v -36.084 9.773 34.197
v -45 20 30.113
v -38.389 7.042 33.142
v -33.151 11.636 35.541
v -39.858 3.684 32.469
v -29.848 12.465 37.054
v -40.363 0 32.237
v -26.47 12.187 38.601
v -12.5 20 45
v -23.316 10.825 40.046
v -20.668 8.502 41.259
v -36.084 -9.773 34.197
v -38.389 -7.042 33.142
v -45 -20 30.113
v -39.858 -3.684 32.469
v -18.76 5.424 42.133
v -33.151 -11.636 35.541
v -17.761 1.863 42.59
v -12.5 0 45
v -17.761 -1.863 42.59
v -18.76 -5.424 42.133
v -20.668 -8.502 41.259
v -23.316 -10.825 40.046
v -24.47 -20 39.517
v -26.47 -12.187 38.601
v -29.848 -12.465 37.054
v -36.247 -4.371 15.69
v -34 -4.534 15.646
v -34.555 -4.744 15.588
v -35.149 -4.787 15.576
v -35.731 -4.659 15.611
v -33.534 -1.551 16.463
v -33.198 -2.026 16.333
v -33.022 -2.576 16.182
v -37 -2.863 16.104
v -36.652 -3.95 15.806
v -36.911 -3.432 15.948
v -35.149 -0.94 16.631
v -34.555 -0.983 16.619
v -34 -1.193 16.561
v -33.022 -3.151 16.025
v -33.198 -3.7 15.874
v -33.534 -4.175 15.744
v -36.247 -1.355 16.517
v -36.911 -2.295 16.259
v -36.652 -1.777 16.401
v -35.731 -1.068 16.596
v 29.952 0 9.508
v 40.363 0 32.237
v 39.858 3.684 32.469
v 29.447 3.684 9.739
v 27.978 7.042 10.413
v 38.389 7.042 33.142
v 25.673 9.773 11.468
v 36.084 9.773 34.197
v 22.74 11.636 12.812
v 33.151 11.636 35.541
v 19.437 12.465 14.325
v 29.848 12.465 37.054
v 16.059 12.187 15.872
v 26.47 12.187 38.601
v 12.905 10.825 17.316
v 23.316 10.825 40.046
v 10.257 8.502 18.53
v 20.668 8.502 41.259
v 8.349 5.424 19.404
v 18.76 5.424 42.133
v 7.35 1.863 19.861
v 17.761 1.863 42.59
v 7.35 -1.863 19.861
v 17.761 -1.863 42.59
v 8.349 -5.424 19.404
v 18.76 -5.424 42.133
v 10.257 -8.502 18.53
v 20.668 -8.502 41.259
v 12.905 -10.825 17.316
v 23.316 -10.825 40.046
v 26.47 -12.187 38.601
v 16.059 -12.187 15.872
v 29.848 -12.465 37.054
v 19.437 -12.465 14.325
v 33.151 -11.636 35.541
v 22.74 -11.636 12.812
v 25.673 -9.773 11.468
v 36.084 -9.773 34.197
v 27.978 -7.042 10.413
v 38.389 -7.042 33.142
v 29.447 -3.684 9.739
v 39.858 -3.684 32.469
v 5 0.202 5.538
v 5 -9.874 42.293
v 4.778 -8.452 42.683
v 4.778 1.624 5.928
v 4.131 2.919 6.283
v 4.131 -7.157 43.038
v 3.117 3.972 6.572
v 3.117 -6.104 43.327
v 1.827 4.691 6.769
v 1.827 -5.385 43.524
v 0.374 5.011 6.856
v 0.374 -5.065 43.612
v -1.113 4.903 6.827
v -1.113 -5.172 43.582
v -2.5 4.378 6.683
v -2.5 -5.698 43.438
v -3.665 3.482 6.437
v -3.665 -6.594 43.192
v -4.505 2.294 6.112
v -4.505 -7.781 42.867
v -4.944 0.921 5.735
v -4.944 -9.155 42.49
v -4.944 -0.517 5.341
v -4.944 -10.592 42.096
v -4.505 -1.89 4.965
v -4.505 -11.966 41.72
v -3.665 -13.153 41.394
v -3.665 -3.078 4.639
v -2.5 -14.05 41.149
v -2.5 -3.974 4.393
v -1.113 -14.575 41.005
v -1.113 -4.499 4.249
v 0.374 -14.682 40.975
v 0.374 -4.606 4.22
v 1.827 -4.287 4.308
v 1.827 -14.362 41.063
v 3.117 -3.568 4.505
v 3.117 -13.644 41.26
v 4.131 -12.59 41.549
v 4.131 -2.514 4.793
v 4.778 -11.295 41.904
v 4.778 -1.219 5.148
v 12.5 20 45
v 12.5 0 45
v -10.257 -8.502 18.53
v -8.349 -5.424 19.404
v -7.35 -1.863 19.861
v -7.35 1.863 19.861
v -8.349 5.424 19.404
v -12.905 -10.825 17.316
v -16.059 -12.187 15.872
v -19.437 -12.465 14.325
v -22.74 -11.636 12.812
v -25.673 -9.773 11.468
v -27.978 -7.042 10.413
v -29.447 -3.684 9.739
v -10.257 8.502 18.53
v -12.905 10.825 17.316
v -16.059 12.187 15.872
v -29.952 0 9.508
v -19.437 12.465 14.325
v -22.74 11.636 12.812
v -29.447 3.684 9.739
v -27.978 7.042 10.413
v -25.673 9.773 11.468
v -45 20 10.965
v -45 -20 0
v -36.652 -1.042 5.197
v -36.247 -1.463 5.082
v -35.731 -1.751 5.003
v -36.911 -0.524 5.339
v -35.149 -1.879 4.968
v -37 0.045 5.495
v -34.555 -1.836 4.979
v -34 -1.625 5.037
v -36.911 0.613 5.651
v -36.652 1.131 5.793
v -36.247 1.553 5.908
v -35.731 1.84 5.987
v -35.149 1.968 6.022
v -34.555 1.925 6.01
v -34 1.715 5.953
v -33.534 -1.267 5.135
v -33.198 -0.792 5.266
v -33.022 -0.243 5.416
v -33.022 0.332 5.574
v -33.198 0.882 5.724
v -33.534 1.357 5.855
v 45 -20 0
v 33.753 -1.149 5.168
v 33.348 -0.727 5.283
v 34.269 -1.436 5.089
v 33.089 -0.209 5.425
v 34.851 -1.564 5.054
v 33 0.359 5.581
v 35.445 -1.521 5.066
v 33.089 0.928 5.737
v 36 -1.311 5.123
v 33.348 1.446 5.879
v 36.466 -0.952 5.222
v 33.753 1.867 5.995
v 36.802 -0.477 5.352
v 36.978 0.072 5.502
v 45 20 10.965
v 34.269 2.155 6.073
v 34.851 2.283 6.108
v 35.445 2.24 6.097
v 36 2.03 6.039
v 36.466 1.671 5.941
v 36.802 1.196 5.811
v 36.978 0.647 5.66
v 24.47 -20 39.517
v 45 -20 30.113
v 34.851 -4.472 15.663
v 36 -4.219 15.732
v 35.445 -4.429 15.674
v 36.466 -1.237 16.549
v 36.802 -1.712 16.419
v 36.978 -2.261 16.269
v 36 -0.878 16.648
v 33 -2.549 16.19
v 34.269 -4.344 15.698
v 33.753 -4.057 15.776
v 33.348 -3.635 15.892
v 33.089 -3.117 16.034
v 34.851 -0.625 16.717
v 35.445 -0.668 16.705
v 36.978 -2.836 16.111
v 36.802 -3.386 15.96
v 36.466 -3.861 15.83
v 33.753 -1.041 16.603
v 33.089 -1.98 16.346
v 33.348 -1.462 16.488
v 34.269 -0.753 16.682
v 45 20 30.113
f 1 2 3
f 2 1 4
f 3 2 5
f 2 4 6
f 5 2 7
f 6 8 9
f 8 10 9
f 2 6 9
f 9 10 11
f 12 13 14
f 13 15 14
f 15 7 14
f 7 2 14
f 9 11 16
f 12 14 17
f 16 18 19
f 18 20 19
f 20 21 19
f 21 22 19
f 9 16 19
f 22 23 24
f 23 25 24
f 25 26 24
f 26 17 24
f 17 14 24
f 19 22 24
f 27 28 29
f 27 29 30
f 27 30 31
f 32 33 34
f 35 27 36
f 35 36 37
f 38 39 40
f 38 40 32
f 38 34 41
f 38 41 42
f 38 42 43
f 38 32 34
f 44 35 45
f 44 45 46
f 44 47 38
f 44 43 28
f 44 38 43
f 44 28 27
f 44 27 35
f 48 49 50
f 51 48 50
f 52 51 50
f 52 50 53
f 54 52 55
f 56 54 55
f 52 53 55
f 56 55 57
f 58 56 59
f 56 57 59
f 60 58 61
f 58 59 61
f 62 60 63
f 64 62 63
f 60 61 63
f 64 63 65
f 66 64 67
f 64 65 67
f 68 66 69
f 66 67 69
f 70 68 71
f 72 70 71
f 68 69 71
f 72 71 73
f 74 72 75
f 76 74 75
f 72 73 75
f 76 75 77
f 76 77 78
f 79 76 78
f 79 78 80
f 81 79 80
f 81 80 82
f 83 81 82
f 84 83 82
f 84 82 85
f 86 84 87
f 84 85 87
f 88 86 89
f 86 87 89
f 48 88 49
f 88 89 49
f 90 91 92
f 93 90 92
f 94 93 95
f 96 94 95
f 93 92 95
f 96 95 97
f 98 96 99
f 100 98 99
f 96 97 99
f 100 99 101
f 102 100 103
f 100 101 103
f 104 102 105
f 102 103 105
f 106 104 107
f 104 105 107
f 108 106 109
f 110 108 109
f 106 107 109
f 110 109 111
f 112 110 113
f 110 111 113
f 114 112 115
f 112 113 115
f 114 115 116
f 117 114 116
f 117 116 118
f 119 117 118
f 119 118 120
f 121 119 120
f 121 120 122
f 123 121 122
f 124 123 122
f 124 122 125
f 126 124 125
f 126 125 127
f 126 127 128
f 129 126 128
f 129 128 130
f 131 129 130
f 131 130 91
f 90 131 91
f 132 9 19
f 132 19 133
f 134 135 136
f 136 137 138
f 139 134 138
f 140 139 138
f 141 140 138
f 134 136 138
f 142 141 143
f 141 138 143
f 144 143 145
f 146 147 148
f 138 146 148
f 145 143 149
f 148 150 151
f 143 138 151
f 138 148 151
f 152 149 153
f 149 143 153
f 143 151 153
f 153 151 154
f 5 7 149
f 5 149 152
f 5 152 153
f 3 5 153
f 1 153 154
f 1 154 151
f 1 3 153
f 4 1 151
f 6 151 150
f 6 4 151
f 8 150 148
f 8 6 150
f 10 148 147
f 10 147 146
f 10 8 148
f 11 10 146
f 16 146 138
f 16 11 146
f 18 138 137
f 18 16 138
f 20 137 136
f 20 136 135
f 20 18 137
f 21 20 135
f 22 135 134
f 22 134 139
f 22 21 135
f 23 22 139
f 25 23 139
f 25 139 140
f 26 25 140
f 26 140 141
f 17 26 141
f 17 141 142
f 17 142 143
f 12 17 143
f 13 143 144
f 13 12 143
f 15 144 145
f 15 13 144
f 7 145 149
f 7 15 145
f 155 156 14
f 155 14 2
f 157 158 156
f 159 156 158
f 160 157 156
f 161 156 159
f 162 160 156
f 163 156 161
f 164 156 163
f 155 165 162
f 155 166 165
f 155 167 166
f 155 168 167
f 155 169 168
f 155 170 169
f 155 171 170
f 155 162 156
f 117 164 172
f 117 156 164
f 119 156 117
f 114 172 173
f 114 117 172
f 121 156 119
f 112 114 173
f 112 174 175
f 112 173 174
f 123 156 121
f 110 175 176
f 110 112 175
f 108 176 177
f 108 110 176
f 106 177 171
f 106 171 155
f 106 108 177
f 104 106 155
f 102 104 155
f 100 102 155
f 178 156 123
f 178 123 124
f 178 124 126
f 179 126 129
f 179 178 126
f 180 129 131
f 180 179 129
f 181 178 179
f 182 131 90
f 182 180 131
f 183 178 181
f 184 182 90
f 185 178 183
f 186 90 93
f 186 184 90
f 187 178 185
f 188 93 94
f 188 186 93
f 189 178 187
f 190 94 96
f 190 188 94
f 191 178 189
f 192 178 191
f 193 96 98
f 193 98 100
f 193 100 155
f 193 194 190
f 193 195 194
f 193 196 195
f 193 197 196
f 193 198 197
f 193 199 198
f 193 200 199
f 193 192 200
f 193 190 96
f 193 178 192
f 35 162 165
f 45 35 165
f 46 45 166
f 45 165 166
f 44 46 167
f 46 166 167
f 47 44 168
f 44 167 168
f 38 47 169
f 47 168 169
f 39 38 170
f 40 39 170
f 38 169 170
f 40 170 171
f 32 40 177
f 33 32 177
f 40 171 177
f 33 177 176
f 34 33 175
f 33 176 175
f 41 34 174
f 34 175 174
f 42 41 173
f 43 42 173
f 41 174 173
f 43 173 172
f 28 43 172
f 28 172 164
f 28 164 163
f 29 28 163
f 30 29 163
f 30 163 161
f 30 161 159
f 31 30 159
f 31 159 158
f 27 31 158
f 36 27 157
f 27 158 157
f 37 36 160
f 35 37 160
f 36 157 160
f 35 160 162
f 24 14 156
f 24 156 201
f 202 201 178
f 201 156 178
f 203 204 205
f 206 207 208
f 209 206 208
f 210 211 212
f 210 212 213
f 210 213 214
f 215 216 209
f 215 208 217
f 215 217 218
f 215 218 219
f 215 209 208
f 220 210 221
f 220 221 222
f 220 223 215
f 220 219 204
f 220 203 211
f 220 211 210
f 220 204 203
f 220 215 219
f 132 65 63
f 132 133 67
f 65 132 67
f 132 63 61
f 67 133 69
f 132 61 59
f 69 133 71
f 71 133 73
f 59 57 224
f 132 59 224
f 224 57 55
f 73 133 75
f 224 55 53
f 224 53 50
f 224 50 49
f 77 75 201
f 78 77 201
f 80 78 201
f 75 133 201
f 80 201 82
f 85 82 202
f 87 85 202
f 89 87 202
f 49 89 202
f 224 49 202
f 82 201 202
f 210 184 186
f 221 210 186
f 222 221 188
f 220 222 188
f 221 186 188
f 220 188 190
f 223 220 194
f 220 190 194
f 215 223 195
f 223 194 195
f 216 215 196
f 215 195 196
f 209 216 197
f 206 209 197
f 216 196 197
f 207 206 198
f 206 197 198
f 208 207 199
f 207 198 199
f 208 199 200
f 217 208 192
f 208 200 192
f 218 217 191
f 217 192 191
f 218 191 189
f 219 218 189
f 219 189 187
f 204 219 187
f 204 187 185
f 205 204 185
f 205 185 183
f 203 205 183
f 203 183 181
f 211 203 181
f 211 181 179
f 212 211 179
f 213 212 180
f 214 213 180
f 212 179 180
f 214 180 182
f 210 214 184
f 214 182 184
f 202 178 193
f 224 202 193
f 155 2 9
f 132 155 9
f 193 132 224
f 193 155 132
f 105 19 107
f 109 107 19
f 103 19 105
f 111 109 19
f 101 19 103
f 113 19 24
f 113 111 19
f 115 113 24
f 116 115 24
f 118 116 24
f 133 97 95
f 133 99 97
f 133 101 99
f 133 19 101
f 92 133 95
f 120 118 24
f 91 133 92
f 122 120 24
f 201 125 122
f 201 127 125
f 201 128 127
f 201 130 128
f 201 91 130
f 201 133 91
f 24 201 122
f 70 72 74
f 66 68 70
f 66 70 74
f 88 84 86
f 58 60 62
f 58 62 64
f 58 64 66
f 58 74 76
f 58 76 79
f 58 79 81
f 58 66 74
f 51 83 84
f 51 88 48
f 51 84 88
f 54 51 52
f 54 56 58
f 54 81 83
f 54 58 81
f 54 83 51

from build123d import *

# Parameters (mm, degrees)
ESQUISSE1_W             = 90
ESQUISSE1_H             = 40
BOSS_EXTRU_1_DEPTH      = 45
ENL_V_MAT_EXTRU_2_DEPTH = 45
ENL_V_MAT_EXTRU_3_DEPTH = 106
ESQUISSE6_R             = 12.5
ENL_V_MAT_EXTRU_4_DEPTH = 25
ESQUISSE7_R             = 5
ENL_V_MAT_EXTRU_5_DEPTH = 56
ESQUISSE9_R             = 2
ENL_V_MAT_EXTRU_6_DEPTH = 11


with BuildPart() as part:
    # Esquisse1 → Boss.-Extru.1 (new body)
    with BuildSketch(Plane.XY):
        Rectangle(ESQUISSE1_W, ESQUISSE1_H)
    extrude(amount=BOSS_EXTRU_1_DEPTH)

    # Esquisse2 → Enlèv. mat.-Extru.2 (cut)
    with BuildSketch(Plane.XZ.offset(20)):
        Polygon((45, 45), (12.5, 45), (45, 30.113476392), align=None)
        Polygon((-45, 30.113476392), (-12.5, 45), (-45, 45), align=None)
    extrude(amount=-ENL_V_MAT_EXTRU_2_DEPTH, mode=Mode.SUBTRACT)

    # Esquisse3 → Enlèv. mat.-Extru.3 (cut)
    with BuildSketch(Plane(origin=(45, 0, 0), x_dir=(0, 0, -1), z_dir=(1, 0, 0))):
        Polygon((0, -20), (-10.965276347, 20), (0, 20), align=None)
        Polygon((-45, 0), (-39.517361826, -20), (-45, -20), align=None)
    extrude(amount=-ENL_V_MAT_EXTRU_3_DEPTH, mode=Mode.SUBTRACT)

    # Esquisse6 → Enlèv. mat.-Extru.4 (cut)
    with BuildSketch(Plane(origin=(19.205292649, 0, 41.928661621), x_dir=(0.90916344, 0, -0.416439478), z_dir=(0.416439478, 0, 0.90916344))):
        with Locations((10.771914446, 0)):
            Circle(ESQUISSE6_R)
    enl_v_mat_extru_4 = extrude(amount=-ENL_V_MAT_EXTRU_4_DEPTH, mode=Mode.SUBTRACT)

    # Symétrie1: Enlèv. mat.-Extru.4 across plane
    add(enl_v_mat_extru_4.mirror(Plane(origin=(0, 0, 0), x_dir=(0, 0, 1), z_dir=(1, 0, 0))), mode=Mode.SUBTRACT)

    # Esquisse7 → Enlèv. mat.-Extru.5 (cut)
    with BuildSketch(Plane(origin=(0, -11.473706327, 41.854690985), x_dir=(1, 0, 0), z_dir=(0, -0.264378055, 0.964419123))):
        with Locations((0, 1.6591408)):
            Circle(ESQUISSE7_R)
    extrude(amount=-ENL_V_MAT_EXTRU_5_DEPTH, mode=Mode.SUBTRACT)

    # Esquisse9 → Enlèv. mat.-Extru.6 (cut)
    with BuildSketch(Plane(origin=(0, -1.397915118, 5.099425034), x_dir=(-1, 0, 0), z_dir=(0, 0.264378055, -0.964419123))):
        with Locations((35, 1.496078457)):
            Circle(ESQUISSE9_R)
        with Locations((-35, 1.822203143)):
            Circle(ESQUISSE9_R)
    extrude(amount=-ENL_V_MAT_EXTRU_6_DEPTH, mode=Mode.SUBTRACT)


solid = part.part
